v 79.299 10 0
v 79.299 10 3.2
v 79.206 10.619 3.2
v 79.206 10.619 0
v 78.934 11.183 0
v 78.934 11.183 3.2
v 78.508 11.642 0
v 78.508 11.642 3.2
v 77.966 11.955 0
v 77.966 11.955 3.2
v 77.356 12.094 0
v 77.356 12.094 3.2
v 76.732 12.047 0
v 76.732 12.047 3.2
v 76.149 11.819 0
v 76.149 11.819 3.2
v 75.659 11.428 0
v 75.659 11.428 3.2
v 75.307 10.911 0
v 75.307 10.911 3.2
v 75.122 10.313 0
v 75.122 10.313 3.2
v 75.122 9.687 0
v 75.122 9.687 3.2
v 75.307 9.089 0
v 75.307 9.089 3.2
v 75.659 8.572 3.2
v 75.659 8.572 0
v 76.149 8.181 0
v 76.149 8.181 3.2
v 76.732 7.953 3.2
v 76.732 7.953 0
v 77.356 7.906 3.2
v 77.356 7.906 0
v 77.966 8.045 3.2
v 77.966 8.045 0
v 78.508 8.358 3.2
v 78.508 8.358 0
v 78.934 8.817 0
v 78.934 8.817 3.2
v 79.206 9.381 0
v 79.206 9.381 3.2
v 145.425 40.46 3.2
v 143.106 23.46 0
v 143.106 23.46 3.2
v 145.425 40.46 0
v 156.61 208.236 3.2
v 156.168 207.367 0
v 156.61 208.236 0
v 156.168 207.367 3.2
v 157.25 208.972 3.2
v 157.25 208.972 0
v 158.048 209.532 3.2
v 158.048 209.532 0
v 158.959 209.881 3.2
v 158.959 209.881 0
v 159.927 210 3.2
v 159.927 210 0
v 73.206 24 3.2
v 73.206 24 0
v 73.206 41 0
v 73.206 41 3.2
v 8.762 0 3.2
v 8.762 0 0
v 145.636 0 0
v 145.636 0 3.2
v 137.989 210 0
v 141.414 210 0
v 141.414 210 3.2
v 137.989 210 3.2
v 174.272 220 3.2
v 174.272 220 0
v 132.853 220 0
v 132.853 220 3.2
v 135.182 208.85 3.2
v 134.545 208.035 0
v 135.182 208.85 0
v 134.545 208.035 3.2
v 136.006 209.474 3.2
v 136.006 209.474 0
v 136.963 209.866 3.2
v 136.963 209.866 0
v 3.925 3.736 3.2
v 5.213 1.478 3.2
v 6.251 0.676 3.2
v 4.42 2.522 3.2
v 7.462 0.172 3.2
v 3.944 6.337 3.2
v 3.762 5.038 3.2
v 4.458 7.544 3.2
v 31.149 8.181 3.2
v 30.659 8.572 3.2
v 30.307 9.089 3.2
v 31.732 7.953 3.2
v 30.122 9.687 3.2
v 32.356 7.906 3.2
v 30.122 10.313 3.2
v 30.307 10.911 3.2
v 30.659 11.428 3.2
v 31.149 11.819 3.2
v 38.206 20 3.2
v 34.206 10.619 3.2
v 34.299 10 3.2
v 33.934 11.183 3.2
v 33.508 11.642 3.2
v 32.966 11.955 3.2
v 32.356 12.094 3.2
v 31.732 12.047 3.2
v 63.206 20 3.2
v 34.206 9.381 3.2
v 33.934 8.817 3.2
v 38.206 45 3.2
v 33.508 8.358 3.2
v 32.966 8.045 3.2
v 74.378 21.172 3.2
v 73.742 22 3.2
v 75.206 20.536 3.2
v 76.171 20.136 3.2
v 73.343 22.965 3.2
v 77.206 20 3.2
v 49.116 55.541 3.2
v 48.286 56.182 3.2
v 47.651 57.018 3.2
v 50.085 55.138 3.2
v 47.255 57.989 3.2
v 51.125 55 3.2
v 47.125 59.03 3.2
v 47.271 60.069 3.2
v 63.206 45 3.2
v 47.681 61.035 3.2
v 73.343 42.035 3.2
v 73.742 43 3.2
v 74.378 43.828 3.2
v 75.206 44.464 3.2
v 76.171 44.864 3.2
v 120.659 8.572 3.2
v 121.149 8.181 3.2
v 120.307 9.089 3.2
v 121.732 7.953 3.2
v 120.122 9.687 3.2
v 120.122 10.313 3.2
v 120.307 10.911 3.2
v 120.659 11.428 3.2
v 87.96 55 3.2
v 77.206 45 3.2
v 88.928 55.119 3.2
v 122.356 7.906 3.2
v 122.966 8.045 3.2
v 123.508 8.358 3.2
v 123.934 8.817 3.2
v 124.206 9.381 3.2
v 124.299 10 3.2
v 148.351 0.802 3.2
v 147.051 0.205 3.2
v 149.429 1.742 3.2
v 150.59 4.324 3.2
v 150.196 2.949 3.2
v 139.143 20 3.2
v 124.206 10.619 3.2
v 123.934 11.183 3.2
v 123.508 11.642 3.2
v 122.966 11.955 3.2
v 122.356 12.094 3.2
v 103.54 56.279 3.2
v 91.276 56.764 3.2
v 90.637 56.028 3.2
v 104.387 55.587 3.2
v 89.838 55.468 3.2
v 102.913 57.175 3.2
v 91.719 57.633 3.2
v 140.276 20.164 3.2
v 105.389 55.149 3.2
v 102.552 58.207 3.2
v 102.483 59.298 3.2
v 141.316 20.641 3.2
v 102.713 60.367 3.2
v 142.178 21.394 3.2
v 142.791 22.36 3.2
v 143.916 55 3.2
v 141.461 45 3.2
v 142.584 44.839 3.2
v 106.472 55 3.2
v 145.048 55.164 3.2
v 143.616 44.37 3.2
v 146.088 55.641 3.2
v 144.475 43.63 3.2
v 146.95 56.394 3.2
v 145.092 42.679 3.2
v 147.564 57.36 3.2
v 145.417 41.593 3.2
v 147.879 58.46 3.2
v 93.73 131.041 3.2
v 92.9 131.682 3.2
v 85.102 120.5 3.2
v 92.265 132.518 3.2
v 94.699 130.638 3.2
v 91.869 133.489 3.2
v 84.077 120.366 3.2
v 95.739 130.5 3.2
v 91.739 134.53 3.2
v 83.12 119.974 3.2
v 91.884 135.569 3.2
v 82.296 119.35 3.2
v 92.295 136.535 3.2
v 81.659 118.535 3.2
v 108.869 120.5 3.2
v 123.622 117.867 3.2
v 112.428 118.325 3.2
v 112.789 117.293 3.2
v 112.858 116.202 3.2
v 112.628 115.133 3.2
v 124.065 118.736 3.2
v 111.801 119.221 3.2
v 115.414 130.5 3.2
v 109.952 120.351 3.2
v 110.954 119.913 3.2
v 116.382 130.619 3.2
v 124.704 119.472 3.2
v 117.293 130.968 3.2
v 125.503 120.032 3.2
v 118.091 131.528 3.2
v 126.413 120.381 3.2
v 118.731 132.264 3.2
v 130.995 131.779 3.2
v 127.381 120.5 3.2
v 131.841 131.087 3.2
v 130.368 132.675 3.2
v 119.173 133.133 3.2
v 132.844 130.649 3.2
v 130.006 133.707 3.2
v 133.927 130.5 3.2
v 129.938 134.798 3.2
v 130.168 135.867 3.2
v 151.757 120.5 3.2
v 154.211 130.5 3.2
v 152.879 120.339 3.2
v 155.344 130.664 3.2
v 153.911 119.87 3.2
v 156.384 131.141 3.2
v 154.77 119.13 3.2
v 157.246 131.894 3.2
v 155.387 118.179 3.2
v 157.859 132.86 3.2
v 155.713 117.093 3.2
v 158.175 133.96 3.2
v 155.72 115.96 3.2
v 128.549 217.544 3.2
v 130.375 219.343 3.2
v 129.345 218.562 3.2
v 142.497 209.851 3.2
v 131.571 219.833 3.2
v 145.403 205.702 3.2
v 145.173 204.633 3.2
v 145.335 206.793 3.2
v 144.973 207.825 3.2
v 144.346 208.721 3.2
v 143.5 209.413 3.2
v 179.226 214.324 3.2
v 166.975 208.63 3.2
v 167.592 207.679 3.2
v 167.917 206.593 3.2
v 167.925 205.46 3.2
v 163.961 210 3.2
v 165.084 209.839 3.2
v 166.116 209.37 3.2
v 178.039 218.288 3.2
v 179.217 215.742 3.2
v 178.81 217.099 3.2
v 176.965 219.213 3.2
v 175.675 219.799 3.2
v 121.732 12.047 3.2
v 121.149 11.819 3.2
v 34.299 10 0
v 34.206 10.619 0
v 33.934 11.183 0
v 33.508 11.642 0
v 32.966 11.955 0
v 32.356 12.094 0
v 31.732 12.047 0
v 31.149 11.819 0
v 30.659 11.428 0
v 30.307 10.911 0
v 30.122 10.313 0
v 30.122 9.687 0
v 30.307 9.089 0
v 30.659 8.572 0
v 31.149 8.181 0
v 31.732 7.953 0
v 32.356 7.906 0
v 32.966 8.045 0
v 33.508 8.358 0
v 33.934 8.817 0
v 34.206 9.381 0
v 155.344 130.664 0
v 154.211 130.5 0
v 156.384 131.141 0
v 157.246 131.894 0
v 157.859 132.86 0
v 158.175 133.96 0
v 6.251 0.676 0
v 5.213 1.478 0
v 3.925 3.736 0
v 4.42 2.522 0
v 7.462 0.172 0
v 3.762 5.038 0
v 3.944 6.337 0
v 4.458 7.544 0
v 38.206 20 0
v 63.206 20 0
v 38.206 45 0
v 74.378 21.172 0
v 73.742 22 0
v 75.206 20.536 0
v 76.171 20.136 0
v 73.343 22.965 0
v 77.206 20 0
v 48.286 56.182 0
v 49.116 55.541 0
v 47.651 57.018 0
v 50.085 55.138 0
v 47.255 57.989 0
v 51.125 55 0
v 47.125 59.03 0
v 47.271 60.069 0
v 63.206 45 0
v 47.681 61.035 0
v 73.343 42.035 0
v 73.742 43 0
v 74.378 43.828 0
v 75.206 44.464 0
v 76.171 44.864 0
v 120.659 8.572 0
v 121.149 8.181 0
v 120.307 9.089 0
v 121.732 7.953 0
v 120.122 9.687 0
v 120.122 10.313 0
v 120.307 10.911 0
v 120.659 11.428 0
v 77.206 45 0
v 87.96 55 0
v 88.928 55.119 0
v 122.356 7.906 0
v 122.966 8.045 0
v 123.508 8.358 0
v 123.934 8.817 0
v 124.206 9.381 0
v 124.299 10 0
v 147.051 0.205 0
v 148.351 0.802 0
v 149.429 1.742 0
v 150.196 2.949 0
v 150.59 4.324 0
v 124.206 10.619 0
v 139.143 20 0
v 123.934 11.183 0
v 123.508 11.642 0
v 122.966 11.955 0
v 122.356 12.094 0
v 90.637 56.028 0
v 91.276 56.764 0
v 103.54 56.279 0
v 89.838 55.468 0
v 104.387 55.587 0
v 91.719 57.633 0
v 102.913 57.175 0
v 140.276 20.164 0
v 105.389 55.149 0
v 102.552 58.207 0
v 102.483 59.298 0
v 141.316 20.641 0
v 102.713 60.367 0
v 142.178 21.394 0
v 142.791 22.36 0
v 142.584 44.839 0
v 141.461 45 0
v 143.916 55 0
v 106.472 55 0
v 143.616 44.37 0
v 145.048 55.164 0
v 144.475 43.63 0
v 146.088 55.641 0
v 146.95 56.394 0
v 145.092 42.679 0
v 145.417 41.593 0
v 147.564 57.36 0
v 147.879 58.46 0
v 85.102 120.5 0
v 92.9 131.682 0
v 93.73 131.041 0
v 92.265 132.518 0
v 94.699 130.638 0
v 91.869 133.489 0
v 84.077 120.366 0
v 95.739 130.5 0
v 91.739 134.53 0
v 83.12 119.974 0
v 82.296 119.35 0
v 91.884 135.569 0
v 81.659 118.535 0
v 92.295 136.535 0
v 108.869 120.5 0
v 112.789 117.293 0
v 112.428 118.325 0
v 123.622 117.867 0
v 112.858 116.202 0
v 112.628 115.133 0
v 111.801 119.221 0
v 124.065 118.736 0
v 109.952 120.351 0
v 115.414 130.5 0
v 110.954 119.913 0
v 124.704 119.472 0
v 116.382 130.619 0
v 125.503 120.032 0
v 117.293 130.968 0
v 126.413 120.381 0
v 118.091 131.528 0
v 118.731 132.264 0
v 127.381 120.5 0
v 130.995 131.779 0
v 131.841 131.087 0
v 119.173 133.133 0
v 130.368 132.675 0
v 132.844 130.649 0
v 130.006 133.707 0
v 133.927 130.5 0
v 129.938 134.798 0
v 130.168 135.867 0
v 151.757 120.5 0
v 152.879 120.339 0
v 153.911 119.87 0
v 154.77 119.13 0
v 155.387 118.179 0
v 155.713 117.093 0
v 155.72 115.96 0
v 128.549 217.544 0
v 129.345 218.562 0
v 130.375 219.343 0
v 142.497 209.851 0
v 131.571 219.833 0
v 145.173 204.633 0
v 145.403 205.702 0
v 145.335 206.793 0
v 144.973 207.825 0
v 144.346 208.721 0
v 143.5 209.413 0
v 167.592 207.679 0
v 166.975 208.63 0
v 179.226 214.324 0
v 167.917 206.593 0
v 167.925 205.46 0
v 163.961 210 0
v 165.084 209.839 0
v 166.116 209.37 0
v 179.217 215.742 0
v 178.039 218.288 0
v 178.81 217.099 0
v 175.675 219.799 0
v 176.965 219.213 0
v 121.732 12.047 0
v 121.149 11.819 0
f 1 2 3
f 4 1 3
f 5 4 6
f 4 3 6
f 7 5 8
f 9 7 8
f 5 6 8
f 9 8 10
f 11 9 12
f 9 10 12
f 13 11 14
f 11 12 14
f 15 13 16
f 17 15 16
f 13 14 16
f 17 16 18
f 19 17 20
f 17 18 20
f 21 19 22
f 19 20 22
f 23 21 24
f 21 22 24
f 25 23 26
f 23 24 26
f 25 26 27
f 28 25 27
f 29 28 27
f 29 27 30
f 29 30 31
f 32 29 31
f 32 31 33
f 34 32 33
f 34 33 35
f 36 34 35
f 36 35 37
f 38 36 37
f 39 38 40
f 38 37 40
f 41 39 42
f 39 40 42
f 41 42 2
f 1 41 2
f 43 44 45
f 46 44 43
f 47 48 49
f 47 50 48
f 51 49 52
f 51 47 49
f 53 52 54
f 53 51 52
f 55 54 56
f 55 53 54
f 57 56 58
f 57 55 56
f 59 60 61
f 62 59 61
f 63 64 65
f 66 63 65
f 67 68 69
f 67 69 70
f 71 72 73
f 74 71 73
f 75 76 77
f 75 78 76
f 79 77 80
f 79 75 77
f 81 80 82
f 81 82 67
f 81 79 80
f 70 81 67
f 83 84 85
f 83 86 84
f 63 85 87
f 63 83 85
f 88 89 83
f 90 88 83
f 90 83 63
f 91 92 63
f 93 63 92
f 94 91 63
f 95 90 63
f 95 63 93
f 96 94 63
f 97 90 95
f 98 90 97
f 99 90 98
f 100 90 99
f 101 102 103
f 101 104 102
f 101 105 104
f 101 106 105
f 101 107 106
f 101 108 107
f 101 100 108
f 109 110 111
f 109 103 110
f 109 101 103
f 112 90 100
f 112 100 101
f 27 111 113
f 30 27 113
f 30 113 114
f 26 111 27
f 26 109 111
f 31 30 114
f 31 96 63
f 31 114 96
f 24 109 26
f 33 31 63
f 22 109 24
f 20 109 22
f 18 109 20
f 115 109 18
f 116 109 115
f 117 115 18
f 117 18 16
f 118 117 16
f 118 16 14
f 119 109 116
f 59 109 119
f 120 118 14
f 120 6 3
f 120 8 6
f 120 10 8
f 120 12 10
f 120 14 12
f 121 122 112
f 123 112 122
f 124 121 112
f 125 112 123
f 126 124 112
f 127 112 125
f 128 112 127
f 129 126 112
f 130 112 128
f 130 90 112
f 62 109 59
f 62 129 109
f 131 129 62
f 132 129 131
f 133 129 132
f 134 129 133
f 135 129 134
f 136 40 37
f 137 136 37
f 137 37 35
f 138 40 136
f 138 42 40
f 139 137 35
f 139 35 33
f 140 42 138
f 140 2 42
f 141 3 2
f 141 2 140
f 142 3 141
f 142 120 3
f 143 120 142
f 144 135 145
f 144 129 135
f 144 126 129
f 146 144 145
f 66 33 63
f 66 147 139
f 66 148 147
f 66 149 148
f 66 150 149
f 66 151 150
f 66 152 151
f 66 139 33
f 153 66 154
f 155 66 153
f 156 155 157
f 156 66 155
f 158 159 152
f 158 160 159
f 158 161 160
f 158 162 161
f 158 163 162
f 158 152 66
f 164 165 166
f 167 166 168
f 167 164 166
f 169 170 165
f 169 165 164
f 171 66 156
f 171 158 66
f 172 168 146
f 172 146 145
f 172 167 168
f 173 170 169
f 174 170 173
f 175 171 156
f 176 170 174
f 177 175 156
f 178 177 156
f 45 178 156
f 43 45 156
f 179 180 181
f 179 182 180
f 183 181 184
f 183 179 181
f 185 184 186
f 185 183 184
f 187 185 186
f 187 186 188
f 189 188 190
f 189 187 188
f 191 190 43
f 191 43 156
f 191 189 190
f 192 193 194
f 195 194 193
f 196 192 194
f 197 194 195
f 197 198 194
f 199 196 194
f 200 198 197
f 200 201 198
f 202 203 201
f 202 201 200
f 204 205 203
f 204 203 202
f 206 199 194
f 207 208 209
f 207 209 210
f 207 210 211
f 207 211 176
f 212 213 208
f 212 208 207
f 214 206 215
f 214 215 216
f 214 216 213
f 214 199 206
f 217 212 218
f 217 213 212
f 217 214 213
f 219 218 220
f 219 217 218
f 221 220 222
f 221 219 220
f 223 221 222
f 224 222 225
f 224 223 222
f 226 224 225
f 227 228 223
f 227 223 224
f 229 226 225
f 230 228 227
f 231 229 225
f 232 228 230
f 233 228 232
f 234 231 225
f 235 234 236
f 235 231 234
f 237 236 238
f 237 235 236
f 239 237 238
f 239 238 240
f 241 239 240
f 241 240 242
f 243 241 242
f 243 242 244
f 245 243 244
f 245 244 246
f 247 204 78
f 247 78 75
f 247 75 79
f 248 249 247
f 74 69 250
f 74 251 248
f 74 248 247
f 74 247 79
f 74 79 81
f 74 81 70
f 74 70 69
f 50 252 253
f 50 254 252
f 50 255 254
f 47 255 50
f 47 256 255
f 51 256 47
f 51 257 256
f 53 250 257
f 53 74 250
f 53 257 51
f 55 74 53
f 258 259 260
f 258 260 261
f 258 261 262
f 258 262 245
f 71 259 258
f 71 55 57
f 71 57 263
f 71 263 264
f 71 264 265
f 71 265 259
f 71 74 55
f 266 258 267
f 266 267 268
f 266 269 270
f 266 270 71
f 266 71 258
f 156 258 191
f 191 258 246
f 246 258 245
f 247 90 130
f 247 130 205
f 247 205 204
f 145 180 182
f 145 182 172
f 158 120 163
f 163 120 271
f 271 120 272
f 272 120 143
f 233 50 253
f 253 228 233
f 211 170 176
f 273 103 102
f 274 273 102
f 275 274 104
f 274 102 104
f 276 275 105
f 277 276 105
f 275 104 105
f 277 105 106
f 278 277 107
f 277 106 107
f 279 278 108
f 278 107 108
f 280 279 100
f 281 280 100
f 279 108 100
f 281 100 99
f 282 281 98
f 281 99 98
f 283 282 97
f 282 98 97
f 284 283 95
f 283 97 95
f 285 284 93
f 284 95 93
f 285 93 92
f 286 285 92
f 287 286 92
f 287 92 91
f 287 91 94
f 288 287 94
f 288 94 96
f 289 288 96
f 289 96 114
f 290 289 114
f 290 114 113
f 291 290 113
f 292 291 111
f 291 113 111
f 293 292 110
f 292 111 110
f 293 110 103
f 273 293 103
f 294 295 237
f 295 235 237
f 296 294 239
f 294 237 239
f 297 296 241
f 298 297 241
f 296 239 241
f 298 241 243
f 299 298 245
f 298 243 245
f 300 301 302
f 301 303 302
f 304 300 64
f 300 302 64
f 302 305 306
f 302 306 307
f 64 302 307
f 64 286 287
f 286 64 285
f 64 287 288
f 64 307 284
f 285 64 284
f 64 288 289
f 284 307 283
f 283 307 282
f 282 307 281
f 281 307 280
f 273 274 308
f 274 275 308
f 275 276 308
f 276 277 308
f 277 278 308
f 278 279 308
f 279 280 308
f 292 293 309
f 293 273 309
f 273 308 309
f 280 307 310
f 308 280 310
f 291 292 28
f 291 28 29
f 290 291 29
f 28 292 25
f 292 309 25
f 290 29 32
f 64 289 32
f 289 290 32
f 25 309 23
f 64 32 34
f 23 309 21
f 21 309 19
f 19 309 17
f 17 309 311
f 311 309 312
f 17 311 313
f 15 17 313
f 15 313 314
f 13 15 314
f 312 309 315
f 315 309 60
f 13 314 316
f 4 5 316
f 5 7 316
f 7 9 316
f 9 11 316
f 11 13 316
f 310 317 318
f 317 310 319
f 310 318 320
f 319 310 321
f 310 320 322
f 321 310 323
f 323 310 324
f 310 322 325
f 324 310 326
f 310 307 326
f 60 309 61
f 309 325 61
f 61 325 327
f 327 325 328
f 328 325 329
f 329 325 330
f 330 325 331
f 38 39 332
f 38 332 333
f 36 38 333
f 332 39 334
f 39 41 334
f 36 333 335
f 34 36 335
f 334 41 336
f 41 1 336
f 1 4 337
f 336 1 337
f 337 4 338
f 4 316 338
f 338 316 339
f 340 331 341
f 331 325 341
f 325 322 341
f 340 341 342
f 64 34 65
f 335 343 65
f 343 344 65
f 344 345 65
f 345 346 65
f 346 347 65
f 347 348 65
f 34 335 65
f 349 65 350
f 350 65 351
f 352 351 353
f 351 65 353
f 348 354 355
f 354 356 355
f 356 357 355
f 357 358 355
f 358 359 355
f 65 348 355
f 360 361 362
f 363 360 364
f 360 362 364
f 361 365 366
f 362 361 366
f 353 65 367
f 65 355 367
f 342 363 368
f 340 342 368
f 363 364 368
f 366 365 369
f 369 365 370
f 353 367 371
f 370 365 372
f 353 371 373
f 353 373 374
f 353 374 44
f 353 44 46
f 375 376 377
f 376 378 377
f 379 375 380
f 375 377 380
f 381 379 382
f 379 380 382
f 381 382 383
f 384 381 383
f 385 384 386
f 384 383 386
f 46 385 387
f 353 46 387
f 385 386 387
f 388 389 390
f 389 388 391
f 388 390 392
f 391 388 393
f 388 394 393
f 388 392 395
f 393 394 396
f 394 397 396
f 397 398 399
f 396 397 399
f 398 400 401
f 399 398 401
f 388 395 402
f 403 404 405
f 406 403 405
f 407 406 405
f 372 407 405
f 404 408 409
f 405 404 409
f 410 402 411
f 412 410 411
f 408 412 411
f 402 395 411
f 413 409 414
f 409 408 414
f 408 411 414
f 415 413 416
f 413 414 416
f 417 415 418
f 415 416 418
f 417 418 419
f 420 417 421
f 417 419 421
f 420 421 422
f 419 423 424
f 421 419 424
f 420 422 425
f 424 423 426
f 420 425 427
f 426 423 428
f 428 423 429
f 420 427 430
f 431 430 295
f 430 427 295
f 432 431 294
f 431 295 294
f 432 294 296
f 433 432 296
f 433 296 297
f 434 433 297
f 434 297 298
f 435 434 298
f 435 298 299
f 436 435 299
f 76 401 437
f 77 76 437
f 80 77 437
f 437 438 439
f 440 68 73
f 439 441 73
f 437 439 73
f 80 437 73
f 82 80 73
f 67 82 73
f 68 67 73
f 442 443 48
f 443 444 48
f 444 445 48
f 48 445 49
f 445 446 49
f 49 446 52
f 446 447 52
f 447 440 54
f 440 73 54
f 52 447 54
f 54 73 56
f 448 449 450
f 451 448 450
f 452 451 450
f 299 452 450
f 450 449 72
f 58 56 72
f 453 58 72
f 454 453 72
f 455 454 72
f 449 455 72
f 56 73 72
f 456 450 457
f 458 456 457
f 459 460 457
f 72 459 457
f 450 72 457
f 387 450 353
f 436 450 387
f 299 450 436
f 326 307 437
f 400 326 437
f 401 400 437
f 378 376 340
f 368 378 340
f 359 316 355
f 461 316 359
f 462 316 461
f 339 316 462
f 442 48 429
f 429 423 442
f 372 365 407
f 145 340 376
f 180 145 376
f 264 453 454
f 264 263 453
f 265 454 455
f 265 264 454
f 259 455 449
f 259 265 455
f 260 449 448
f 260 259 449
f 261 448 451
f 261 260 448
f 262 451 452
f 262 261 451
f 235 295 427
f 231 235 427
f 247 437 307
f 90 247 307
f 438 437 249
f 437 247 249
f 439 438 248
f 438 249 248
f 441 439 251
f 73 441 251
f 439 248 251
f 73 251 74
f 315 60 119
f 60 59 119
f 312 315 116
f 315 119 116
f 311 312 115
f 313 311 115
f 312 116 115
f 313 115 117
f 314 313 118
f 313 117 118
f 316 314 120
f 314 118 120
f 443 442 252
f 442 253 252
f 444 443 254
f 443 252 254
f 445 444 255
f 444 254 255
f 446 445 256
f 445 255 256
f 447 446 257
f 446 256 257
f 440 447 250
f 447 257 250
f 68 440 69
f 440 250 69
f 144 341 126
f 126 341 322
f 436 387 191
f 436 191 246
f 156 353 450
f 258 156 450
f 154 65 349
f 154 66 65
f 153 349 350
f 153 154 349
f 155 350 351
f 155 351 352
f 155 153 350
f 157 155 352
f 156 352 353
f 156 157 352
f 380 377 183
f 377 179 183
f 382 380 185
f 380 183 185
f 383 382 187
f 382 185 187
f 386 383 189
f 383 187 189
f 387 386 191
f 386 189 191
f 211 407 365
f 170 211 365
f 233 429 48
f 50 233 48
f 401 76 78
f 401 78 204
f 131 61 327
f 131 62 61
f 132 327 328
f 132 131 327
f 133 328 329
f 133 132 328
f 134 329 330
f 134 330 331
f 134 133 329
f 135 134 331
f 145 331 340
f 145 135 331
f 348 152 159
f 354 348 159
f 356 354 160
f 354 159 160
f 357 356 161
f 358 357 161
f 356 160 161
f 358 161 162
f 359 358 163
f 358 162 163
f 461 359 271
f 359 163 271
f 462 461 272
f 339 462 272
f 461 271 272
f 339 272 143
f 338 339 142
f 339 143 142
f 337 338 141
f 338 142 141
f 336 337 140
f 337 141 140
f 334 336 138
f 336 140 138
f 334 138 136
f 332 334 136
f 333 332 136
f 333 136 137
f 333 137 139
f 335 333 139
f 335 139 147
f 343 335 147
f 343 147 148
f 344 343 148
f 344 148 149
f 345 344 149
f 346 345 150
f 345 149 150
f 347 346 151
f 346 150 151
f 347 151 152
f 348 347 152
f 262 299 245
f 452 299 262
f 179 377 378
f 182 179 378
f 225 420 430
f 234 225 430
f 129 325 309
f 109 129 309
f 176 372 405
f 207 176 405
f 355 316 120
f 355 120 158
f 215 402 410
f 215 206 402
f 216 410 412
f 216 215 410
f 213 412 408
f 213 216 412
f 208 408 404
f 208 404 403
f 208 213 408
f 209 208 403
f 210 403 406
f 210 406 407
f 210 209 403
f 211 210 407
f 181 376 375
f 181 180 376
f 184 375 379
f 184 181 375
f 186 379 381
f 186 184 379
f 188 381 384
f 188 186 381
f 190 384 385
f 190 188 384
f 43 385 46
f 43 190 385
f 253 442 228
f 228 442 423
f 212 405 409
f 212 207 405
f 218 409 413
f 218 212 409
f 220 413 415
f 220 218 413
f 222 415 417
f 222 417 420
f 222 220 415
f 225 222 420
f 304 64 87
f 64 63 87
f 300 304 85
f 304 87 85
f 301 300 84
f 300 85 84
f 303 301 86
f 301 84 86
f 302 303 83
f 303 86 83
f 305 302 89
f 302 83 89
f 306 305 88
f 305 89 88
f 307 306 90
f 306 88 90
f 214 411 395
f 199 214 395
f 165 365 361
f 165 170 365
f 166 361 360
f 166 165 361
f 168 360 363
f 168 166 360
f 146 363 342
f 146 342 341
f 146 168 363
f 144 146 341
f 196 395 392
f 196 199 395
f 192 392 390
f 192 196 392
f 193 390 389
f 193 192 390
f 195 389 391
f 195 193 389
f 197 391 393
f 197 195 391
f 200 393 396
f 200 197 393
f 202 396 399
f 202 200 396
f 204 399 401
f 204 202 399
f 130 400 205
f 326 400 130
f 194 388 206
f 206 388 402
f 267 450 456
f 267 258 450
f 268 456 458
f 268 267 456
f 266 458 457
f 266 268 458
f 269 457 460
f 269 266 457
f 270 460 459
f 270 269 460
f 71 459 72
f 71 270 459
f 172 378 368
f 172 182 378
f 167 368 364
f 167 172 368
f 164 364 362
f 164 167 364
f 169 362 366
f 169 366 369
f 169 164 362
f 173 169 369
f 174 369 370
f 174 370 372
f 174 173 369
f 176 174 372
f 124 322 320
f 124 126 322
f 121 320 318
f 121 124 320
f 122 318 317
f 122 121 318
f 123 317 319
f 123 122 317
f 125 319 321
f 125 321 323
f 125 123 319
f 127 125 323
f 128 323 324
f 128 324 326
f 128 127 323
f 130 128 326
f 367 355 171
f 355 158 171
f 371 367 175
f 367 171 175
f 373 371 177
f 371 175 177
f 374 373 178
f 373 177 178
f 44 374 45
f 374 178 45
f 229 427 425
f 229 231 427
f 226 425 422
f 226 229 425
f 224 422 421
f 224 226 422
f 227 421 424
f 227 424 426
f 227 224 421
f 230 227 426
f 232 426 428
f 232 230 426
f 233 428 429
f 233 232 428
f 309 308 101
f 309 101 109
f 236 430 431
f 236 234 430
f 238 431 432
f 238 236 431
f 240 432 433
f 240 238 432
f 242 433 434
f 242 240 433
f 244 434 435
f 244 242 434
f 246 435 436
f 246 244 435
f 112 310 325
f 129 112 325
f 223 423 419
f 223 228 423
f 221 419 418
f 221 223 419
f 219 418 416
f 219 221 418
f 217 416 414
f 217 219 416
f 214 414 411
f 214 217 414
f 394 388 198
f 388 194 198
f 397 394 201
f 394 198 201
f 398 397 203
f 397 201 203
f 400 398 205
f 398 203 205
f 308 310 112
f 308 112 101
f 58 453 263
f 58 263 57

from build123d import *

# Parameters (mm, degrees)
EXTRUDE_1_DEPTH            = 3.2
FILLET_1_R                 = 5
SKETCH_2_R                 = 2.1
CUT_EXTRUDE_1_DEPTH        = 3.2
PATTERN_LINEAR_1_COUNT     = 2
PATTERN_LINEAR_1_PITCH     = 45
PATTERN_LINEAR_1_COL_COUNT = 2
PATTERN_LINEAR_1_COL_PITCH = 45
EXTRUDE_2_DEPTH            = 3.2
FILLET_2_R                 = 4


with BuildPart() as part:
    # Эскиз1 → Бобышка-Вытянуть1 (new body)
    with BuildSketch(Plane.XY):
        Polygon((0, 0), (150, 0), (180, 220), (130, 220), align=None)
        Polygon((135.706302127, 210), (23.433574854, 20), (142.634725768, 20), (168.543816677, 210), align=None, mode=Mode.SUBTRACT)
    extrude(amount=EXTRUDE_1_DEPTH)

    # Скругление1
    fillet_1_edges = [part.edges().sort_by_distance(p)[0] for p in [
        (130, 220, 1.6),
        (180, 220, 1.6),
        (150, 0, 1.6),
        (0, 0, 1.6),
    ]]
    fillet(fillet_1_edges, radius=FILLET_1_R)

    # Эскиз2 → Вырез-Вытянуть1 (cut)
    with BuildSketch(Plane.XY.offset(3.2)):
        with Locations((77.198893337, 10)):
            Circle(SKETCH_2_R)
    cut_extrude_1 = extrude(amount=-CUT_EXTRUDE_1_DEPTH, mode=Mode.SUBTRACT)

    # Линейный массив1: Вырез-Вытянуть1 ×2
    with Locations(*[(i * PATTERN_LINEAR_1_PITCH, 0, 0) for i in range(1, PATTERN_LINEAR_1_COUNT)]):
        add(cut_extrude_1, mode=Mode.SUBTRACT)

    # Линейный массив1 col: Вырез-Вытянуть1 ×2
    with Locations(*[(-i * PATTERN_LINEAR_1_COL_PITCH, 0, 0) for i in range(1, PATTERN_LINEAR_1_COL_COUNT)]):
        add(cut_extrude_1, mode=Mode.SUBTRACT)

    # Эскиз4 → Бобышка-Вытянуть2 (add)
    with BuildSketch(Plane.XY):
        Polygon((44.115393036, 55), (38.206302127, 45), (63.206302127, 45), (63.206302127, 20), (73.206302127, 20), (73.206302127, 45), (92.125059402, 45), (152.125059402, 210), (147.125059402, 210), (118.215968493, 130.5), (88.729029399, 130.5), (82.81993849, 120.5), (114.579604856, 120.5), (90.761423038, 55), align=None)
        Polygon((152.125059402, 210), (92.125059402, 45), (146.043816677, 45), (147.40745304, 55), (100.761423038, 55), (124.579604856, 120.5), (156.339271222, 120.5), (157.702907586, 130.5), (128.215968493, 130.5), (157.125059402, 210), align=None)
        Polygon((38.206302127, 45), (38.206302127, 20), (23.433574854, 20), align=None)
    extrude(amount=EXTRUDE_2_DEPTH)

    # Скругление2
    fillet_2_edges = [part.edges().sort_by_distance(p)[0] for p in [
        (147.125059402, 210, 1.6),
        (118.215968493, 130.5, 1.6),
        (88.729029399, 130.5, 1.6),
        (82.81993849, 120.5, 1.6),
        (114.579604856, 120.5, 1.6),
        (90.761423038, 55, 1.6),
        (44.115393036, 55, 1.6),
        (73.206302127, 20, 1.6),
        (168.543816677, 210, 1.6),
        (135.706302127, 210, 1.6),
        (142.634725768, 20, 1.6),
        (73.206302127, 45, 1.6),
        (146.043816677, 45, 1.6),
        (147.40745304, 55, 1.6),
        (100.761423038, 55, 1.6),
        (124.579604856, 120.5, 1.6),
        (156.339271222, 120.5, 1.6),
        (157.702907586, 130.5, 1.6),
        (128.215968493, 130.5, 1.6),
        (157.125059402, 210, 1.6),
    ]]
    fillet(fillet_2_edges, radius=FILLET_2_R)


solid = part.part
